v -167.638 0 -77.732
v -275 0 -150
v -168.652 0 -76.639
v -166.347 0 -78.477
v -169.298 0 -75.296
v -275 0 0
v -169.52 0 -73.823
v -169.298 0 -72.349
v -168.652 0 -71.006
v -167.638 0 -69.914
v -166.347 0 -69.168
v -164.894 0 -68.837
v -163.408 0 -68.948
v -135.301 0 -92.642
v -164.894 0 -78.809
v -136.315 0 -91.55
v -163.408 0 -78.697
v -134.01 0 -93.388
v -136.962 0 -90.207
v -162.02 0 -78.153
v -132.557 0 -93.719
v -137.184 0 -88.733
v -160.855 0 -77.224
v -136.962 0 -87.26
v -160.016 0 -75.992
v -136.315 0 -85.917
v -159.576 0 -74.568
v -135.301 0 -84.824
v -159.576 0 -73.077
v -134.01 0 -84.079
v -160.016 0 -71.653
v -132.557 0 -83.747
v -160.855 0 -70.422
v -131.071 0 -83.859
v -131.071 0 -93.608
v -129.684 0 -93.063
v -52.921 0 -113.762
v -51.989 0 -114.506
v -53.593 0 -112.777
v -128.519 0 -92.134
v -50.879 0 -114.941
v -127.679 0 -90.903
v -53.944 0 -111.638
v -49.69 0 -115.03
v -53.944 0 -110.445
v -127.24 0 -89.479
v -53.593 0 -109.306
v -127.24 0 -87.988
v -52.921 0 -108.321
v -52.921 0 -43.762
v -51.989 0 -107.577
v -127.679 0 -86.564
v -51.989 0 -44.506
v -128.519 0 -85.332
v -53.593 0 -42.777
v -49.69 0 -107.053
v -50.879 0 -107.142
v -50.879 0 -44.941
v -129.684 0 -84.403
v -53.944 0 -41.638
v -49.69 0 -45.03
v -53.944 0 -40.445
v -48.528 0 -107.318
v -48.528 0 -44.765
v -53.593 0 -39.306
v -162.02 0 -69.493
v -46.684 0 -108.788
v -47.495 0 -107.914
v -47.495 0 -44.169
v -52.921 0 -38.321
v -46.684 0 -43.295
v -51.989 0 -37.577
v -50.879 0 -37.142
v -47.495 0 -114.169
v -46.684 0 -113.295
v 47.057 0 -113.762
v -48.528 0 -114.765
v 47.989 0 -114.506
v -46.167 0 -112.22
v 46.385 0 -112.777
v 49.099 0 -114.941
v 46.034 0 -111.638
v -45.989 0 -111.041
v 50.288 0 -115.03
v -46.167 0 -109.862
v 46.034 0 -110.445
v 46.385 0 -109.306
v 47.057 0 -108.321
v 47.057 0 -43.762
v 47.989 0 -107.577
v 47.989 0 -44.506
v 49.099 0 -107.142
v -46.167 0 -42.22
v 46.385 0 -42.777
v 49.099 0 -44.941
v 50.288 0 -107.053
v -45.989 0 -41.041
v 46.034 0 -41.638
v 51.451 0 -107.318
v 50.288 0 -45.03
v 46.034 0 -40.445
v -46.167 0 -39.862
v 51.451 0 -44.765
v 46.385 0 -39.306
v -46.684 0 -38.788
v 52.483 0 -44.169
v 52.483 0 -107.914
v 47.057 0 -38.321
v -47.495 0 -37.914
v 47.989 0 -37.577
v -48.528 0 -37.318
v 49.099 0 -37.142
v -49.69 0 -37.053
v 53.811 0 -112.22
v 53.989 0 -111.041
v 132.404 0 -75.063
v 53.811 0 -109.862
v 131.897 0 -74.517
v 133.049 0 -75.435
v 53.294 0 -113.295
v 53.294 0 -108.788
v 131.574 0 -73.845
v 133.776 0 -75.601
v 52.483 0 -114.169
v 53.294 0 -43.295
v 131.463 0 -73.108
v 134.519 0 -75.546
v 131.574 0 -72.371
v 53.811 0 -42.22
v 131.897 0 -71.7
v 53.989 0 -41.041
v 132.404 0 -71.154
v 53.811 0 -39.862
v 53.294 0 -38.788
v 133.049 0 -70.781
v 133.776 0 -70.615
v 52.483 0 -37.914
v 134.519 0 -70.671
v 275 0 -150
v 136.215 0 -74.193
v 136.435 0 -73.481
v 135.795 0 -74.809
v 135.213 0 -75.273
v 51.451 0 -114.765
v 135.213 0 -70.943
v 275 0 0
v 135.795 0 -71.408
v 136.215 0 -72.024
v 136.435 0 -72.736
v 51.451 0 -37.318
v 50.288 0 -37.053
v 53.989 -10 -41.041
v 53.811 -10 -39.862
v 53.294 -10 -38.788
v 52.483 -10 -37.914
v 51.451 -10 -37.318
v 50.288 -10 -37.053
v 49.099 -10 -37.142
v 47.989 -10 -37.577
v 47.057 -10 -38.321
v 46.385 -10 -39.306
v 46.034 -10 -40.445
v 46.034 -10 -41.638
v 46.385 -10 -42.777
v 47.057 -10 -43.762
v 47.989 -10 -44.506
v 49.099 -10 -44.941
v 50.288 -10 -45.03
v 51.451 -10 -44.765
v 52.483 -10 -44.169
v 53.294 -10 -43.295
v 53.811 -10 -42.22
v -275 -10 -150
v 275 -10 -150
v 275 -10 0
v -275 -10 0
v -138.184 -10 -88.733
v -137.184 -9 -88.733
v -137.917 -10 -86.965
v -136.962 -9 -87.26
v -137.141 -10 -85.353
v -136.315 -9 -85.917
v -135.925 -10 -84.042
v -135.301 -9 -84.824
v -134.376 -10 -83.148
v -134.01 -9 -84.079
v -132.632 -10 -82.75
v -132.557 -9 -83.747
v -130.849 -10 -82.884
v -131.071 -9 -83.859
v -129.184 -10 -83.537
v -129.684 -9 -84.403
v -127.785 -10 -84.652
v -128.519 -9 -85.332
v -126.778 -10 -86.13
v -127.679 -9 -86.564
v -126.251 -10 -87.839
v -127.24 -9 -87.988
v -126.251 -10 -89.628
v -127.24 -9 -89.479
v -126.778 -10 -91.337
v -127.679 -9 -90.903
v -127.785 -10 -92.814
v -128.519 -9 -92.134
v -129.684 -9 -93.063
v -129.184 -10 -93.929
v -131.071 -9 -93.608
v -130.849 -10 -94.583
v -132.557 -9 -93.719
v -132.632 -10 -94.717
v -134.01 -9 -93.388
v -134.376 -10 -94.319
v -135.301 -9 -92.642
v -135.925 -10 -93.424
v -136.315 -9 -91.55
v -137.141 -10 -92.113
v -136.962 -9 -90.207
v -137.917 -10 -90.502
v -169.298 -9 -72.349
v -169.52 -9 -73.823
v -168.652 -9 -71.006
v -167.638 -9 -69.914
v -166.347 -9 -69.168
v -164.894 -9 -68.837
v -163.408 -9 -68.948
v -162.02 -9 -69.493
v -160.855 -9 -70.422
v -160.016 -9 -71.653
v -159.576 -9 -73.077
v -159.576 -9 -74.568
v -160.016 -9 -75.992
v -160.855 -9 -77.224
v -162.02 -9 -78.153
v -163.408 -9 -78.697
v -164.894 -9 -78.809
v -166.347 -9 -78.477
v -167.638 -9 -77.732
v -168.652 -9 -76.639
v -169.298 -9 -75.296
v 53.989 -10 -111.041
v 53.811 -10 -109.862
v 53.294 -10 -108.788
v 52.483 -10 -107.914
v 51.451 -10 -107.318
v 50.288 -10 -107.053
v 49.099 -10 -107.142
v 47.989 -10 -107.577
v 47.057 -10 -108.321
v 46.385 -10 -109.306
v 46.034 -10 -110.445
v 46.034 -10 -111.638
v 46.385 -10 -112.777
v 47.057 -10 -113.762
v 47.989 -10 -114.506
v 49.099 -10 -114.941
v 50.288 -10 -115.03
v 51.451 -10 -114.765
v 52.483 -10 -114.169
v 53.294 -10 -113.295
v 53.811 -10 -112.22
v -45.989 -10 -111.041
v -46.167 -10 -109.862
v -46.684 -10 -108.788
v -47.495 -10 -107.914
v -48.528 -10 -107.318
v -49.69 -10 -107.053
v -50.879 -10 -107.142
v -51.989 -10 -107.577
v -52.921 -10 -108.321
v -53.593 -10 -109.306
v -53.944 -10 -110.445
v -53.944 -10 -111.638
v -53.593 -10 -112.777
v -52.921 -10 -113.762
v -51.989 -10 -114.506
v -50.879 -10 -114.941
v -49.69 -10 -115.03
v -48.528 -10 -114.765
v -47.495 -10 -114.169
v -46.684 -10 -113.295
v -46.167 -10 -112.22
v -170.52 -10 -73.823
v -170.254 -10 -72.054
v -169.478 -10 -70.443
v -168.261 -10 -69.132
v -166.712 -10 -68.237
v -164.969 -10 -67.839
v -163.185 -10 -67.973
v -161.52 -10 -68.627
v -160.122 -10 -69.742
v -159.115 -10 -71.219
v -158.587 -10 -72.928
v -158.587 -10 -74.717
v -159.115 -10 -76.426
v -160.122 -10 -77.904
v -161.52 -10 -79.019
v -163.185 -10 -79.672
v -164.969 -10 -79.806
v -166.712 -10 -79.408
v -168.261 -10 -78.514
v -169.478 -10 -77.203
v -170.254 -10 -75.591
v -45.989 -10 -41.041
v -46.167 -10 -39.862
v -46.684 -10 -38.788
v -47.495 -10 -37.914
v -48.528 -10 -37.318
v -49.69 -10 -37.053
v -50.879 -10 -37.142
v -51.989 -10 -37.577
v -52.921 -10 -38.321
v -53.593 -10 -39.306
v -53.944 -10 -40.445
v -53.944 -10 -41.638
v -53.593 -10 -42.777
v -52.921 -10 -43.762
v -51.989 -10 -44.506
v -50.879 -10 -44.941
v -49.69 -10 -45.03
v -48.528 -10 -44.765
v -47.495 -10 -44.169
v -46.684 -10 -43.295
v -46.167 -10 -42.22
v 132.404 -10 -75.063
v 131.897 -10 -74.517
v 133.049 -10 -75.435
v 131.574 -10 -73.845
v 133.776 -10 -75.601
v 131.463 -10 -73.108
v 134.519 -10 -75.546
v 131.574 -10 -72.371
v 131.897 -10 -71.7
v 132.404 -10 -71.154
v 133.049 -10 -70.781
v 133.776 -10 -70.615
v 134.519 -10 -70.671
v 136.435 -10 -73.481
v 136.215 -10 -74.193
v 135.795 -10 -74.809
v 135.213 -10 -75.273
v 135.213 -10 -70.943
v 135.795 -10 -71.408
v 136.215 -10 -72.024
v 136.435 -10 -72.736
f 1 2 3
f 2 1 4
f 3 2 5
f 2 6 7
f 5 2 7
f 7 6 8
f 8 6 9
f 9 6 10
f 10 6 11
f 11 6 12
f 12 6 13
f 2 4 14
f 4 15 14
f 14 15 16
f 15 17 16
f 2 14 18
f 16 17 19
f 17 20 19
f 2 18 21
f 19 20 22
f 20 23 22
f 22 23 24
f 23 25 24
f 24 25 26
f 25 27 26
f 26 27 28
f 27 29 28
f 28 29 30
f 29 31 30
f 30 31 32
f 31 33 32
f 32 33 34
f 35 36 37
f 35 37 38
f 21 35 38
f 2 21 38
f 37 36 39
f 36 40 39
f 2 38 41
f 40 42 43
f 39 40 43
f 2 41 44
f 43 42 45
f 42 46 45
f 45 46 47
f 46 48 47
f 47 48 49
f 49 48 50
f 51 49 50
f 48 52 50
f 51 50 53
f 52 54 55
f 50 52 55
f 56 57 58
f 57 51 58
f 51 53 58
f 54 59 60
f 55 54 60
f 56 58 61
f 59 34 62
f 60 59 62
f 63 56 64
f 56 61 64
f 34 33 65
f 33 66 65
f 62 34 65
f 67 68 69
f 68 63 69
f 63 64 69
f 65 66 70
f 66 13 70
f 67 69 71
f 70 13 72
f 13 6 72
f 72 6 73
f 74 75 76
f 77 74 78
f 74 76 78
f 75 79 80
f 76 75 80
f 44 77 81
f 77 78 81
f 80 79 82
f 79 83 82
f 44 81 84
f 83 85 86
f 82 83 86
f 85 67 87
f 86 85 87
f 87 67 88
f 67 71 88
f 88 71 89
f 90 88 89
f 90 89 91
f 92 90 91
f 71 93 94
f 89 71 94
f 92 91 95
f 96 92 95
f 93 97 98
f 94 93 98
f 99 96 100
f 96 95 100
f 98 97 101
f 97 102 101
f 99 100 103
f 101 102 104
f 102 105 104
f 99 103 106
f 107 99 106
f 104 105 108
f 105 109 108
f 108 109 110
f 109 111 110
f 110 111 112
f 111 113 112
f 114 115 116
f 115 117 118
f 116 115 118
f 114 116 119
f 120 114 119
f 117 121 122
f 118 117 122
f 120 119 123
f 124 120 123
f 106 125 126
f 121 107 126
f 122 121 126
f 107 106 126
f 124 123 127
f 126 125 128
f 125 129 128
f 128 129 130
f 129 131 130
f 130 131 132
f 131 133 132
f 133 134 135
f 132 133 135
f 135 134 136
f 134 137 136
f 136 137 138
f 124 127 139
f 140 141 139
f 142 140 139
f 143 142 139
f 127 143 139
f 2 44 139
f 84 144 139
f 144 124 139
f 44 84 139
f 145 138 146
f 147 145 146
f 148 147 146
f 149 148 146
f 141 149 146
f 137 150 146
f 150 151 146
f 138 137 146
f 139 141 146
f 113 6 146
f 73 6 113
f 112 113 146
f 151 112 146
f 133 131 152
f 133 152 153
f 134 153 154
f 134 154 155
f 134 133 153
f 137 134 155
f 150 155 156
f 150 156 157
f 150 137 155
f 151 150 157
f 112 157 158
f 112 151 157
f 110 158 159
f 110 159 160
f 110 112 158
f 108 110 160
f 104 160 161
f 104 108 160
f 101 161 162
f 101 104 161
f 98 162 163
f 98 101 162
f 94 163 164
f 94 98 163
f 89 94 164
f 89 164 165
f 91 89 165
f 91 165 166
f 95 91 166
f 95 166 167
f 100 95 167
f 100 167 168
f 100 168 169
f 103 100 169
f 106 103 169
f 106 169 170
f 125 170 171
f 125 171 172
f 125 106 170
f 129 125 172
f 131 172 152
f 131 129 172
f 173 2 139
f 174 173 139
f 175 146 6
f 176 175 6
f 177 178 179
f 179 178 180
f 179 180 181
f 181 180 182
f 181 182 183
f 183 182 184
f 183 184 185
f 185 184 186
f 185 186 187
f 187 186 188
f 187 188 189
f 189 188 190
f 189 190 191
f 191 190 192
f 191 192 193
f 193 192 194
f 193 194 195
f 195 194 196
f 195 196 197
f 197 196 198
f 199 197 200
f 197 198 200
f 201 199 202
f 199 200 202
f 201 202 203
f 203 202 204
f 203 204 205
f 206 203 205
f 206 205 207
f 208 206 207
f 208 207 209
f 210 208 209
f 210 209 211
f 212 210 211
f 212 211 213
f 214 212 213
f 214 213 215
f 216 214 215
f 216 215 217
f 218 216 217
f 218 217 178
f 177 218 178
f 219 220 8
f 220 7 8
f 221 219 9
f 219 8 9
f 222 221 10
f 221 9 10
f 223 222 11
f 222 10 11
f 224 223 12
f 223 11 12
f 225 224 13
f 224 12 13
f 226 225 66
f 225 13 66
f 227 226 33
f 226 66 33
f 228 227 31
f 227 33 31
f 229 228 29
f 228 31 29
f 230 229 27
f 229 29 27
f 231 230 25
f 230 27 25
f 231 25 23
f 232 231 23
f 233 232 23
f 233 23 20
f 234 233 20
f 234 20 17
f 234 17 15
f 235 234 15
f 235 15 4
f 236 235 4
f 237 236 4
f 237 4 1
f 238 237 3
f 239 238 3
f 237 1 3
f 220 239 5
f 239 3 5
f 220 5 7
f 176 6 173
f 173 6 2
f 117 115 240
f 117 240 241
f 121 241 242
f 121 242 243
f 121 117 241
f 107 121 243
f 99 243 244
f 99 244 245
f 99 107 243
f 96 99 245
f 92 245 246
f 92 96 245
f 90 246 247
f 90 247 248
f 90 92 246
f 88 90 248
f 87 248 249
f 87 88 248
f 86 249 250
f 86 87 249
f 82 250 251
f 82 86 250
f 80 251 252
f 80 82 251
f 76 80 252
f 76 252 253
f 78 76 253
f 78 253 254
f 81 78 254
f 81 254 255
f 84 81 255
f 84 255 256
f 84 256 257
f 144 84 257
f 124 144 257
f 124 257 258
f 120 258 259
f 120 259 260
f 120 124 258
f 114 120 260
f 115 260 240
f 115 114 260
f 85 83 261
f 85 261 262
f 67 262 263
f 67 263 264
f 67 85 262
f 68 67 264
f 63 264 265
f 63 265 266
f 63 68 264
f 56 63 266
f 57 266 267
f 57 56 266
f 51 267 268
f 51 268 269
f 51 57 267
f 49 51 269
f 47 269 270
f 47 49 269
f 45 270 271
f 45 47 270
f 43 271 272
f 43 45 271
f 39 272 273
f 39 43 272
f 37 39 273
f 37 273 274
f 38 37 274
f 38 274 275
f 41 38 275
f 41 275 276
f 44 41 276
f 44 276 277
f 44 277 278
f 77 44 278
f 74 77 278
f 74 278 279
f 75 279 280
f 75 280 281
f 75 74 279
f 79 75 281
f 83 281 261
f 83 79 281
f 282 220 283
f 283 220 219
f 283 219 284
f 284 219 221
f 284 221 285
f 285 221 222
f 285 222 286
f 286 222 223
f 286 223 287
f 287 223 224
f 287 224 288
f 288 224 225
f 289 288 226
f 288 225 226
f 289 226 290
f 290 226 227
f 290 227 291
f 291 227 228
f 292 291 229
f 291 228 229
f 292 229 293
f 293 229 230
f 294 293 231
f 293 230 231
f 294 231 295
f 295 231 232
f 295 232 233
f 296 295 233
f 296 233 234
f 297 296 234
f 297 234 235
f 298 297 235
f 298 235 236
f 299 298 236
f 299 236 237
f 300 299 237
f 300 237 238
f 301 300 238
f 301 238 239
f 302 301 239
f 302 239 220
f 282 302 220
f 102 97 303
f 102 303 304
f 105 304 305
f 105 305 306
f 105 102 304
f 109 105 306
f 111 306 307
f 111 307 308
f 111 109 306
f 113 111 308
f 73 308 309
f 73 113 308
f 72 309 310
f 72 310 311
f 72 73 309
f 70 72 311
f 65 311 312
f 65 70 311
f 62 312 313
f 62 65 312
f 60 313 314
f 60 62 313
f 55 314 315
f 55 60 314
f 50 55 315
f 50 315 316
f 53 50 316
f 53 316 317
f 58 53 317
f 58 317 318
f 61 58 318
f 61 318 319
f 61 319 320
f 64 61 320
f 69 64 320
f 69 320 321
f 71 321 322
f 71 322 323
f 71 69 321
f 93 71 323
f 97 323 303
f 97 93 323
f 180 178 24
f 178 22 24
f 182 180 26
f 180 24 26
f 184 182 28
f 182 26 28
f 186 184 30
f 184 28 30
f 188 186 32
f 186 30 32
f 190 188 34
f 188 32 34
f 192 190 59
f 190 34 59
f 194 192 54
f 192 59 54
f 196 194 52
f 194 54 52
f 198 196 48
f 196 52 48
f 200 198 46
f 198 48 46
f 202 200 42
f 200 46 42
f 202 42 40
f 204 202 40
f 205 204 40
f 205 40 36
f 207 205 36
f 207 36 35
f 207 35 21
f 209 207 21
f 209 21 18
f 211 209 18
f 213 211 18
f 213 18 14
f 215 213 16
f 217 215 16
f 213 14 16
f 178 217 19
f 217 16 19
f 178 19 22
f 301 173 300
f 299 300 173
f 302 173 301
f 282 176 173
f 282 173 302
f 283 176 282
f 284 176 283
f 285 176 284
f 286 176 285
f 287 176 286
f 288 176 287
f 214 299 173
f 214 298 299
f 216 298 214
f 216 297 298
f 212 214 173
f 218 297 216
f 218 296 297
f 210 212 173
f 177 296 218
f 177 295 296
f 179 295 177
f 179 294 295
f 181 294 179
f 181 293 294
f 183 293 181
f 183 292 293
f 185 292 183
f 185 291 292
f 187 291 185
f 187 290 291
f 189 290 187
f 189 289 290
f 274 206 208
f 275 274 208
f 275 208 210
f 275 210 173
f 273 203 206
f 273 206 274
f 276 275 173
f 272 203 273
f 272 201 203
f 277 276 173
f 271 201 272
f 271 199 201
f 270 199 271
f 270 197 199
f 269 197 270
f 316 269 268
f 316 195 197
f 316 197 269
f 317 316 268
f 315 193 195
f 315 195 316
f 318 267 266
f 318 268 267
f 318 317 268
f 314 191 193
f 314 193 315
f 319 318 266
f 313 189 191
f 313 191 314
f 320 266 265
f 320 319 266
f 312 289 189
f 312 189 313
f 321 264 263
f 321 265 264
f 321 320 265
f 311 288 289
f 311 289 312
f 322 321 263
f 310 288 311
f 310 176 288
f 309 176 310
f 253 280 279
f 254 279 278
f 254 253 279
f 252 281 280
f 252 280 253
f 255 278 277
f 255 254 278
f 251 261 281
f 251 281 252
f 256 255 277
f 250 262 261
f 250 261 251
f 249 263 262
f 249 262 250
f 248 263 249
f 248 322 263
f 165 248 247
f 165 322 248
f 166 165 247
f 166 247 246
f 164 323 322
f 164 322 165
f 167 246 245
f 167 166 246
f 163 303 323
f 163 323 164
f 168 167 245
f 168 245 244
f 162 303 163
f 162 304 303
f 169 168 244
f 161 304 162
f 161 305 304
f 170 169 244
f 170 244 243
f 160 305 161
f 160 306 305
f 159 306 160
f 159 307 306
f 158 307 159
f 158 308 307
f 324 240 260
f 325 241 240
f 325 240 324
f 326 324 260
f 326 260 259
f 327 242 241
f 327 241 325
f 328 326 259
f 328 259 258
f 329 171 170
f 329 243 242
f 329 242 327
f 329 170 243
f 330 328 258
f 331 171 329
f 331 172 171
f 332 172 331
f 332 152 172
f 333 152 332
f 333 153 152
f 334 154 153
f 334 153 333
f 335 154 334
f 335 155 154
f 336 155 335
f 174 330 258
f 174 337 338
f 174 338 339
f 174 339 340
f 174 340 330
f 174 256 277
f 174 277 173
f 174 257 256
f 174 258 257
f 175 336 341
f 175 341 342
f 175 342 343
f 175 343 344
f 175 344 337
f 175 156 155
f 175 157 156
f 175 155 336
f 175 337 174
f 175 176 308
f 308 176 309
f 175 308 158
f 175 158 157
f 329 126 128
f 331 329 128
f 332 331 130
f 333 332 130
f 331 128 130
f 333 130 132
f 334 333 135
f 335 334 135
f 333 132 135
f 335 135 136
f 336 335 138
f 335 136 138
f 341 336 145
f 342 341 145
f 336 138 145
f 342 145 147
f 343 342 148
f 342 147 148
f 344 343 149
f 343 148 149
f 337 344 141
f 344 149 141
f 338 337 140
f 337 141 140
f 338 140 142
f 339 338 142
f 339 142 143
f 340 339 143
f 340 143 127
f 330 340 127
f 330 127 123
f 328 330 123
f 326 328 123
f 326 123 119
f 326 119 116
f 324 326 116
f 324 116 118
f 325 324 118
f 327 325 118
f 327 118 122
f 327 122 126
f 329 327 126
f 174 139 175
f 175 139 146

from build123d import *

# Parameters (mm, degrees)
F0_R           = 4
F1_DEPTH       = 10
F3_D           = 10
F3_CSINK_D     = 12
F3_CSINK_ANGLE = 90
F4_D           = 10
F4_CSINK_D     = 12
F4_CSINK_ANGLE = 90
F6_D           = 5


with BuildPart() as f1:
    # F0 (on Front) → F1 (new body)
    with BuildSketch(Plane.XZ):
        Polygon((0, 0), (-275, 0), (-275, -150), (275, -150), (275, 0), (50, 0), align=None)
        with Locations((-49.989153, -111.041441)):
            Circle(F0_R, mode=Mode.SUBTRACT)
        with Locations((49.989153, -111.041441)):
            Circle(F0_R, mode=Mode.SUBTRACT)
        with Locations((-49.989153, -41.041441)):
            Circle(F0_R, mode=Mode.SUBTRACT)
        with Locations((49.989153, -41.041441)):
            Circle(F0_R, mode=Mode.SUBTRACT)
    extrude(amount=F1_DEPTH)

    # F3 (through all)
    with Locations(Plane.XZ.offset(10)):
        with Locations((-132.18379, -88.733308)):
            CounterSinkHole(F3_D / 2, F3_CSINK_D / 2, counter_sink_angle=F3_CSINK_ANGLE)

    # F4 (through all)
    with Locations(Plane.XZ.offset(10)):
        with Locations((-164.520353, -73.822677)):
            CounterSinkHole(F4_D / 2, F4_CSINK_D / 2, counter_sink_angle=F4_CSINK_ANGLE)

    # F6 (through all)
    with Locations(Plane.XZ.offset(10)):
        with Locations((133.962631, -73.108293)):
            Hole(F6_D / 2)


solid = f1.part
